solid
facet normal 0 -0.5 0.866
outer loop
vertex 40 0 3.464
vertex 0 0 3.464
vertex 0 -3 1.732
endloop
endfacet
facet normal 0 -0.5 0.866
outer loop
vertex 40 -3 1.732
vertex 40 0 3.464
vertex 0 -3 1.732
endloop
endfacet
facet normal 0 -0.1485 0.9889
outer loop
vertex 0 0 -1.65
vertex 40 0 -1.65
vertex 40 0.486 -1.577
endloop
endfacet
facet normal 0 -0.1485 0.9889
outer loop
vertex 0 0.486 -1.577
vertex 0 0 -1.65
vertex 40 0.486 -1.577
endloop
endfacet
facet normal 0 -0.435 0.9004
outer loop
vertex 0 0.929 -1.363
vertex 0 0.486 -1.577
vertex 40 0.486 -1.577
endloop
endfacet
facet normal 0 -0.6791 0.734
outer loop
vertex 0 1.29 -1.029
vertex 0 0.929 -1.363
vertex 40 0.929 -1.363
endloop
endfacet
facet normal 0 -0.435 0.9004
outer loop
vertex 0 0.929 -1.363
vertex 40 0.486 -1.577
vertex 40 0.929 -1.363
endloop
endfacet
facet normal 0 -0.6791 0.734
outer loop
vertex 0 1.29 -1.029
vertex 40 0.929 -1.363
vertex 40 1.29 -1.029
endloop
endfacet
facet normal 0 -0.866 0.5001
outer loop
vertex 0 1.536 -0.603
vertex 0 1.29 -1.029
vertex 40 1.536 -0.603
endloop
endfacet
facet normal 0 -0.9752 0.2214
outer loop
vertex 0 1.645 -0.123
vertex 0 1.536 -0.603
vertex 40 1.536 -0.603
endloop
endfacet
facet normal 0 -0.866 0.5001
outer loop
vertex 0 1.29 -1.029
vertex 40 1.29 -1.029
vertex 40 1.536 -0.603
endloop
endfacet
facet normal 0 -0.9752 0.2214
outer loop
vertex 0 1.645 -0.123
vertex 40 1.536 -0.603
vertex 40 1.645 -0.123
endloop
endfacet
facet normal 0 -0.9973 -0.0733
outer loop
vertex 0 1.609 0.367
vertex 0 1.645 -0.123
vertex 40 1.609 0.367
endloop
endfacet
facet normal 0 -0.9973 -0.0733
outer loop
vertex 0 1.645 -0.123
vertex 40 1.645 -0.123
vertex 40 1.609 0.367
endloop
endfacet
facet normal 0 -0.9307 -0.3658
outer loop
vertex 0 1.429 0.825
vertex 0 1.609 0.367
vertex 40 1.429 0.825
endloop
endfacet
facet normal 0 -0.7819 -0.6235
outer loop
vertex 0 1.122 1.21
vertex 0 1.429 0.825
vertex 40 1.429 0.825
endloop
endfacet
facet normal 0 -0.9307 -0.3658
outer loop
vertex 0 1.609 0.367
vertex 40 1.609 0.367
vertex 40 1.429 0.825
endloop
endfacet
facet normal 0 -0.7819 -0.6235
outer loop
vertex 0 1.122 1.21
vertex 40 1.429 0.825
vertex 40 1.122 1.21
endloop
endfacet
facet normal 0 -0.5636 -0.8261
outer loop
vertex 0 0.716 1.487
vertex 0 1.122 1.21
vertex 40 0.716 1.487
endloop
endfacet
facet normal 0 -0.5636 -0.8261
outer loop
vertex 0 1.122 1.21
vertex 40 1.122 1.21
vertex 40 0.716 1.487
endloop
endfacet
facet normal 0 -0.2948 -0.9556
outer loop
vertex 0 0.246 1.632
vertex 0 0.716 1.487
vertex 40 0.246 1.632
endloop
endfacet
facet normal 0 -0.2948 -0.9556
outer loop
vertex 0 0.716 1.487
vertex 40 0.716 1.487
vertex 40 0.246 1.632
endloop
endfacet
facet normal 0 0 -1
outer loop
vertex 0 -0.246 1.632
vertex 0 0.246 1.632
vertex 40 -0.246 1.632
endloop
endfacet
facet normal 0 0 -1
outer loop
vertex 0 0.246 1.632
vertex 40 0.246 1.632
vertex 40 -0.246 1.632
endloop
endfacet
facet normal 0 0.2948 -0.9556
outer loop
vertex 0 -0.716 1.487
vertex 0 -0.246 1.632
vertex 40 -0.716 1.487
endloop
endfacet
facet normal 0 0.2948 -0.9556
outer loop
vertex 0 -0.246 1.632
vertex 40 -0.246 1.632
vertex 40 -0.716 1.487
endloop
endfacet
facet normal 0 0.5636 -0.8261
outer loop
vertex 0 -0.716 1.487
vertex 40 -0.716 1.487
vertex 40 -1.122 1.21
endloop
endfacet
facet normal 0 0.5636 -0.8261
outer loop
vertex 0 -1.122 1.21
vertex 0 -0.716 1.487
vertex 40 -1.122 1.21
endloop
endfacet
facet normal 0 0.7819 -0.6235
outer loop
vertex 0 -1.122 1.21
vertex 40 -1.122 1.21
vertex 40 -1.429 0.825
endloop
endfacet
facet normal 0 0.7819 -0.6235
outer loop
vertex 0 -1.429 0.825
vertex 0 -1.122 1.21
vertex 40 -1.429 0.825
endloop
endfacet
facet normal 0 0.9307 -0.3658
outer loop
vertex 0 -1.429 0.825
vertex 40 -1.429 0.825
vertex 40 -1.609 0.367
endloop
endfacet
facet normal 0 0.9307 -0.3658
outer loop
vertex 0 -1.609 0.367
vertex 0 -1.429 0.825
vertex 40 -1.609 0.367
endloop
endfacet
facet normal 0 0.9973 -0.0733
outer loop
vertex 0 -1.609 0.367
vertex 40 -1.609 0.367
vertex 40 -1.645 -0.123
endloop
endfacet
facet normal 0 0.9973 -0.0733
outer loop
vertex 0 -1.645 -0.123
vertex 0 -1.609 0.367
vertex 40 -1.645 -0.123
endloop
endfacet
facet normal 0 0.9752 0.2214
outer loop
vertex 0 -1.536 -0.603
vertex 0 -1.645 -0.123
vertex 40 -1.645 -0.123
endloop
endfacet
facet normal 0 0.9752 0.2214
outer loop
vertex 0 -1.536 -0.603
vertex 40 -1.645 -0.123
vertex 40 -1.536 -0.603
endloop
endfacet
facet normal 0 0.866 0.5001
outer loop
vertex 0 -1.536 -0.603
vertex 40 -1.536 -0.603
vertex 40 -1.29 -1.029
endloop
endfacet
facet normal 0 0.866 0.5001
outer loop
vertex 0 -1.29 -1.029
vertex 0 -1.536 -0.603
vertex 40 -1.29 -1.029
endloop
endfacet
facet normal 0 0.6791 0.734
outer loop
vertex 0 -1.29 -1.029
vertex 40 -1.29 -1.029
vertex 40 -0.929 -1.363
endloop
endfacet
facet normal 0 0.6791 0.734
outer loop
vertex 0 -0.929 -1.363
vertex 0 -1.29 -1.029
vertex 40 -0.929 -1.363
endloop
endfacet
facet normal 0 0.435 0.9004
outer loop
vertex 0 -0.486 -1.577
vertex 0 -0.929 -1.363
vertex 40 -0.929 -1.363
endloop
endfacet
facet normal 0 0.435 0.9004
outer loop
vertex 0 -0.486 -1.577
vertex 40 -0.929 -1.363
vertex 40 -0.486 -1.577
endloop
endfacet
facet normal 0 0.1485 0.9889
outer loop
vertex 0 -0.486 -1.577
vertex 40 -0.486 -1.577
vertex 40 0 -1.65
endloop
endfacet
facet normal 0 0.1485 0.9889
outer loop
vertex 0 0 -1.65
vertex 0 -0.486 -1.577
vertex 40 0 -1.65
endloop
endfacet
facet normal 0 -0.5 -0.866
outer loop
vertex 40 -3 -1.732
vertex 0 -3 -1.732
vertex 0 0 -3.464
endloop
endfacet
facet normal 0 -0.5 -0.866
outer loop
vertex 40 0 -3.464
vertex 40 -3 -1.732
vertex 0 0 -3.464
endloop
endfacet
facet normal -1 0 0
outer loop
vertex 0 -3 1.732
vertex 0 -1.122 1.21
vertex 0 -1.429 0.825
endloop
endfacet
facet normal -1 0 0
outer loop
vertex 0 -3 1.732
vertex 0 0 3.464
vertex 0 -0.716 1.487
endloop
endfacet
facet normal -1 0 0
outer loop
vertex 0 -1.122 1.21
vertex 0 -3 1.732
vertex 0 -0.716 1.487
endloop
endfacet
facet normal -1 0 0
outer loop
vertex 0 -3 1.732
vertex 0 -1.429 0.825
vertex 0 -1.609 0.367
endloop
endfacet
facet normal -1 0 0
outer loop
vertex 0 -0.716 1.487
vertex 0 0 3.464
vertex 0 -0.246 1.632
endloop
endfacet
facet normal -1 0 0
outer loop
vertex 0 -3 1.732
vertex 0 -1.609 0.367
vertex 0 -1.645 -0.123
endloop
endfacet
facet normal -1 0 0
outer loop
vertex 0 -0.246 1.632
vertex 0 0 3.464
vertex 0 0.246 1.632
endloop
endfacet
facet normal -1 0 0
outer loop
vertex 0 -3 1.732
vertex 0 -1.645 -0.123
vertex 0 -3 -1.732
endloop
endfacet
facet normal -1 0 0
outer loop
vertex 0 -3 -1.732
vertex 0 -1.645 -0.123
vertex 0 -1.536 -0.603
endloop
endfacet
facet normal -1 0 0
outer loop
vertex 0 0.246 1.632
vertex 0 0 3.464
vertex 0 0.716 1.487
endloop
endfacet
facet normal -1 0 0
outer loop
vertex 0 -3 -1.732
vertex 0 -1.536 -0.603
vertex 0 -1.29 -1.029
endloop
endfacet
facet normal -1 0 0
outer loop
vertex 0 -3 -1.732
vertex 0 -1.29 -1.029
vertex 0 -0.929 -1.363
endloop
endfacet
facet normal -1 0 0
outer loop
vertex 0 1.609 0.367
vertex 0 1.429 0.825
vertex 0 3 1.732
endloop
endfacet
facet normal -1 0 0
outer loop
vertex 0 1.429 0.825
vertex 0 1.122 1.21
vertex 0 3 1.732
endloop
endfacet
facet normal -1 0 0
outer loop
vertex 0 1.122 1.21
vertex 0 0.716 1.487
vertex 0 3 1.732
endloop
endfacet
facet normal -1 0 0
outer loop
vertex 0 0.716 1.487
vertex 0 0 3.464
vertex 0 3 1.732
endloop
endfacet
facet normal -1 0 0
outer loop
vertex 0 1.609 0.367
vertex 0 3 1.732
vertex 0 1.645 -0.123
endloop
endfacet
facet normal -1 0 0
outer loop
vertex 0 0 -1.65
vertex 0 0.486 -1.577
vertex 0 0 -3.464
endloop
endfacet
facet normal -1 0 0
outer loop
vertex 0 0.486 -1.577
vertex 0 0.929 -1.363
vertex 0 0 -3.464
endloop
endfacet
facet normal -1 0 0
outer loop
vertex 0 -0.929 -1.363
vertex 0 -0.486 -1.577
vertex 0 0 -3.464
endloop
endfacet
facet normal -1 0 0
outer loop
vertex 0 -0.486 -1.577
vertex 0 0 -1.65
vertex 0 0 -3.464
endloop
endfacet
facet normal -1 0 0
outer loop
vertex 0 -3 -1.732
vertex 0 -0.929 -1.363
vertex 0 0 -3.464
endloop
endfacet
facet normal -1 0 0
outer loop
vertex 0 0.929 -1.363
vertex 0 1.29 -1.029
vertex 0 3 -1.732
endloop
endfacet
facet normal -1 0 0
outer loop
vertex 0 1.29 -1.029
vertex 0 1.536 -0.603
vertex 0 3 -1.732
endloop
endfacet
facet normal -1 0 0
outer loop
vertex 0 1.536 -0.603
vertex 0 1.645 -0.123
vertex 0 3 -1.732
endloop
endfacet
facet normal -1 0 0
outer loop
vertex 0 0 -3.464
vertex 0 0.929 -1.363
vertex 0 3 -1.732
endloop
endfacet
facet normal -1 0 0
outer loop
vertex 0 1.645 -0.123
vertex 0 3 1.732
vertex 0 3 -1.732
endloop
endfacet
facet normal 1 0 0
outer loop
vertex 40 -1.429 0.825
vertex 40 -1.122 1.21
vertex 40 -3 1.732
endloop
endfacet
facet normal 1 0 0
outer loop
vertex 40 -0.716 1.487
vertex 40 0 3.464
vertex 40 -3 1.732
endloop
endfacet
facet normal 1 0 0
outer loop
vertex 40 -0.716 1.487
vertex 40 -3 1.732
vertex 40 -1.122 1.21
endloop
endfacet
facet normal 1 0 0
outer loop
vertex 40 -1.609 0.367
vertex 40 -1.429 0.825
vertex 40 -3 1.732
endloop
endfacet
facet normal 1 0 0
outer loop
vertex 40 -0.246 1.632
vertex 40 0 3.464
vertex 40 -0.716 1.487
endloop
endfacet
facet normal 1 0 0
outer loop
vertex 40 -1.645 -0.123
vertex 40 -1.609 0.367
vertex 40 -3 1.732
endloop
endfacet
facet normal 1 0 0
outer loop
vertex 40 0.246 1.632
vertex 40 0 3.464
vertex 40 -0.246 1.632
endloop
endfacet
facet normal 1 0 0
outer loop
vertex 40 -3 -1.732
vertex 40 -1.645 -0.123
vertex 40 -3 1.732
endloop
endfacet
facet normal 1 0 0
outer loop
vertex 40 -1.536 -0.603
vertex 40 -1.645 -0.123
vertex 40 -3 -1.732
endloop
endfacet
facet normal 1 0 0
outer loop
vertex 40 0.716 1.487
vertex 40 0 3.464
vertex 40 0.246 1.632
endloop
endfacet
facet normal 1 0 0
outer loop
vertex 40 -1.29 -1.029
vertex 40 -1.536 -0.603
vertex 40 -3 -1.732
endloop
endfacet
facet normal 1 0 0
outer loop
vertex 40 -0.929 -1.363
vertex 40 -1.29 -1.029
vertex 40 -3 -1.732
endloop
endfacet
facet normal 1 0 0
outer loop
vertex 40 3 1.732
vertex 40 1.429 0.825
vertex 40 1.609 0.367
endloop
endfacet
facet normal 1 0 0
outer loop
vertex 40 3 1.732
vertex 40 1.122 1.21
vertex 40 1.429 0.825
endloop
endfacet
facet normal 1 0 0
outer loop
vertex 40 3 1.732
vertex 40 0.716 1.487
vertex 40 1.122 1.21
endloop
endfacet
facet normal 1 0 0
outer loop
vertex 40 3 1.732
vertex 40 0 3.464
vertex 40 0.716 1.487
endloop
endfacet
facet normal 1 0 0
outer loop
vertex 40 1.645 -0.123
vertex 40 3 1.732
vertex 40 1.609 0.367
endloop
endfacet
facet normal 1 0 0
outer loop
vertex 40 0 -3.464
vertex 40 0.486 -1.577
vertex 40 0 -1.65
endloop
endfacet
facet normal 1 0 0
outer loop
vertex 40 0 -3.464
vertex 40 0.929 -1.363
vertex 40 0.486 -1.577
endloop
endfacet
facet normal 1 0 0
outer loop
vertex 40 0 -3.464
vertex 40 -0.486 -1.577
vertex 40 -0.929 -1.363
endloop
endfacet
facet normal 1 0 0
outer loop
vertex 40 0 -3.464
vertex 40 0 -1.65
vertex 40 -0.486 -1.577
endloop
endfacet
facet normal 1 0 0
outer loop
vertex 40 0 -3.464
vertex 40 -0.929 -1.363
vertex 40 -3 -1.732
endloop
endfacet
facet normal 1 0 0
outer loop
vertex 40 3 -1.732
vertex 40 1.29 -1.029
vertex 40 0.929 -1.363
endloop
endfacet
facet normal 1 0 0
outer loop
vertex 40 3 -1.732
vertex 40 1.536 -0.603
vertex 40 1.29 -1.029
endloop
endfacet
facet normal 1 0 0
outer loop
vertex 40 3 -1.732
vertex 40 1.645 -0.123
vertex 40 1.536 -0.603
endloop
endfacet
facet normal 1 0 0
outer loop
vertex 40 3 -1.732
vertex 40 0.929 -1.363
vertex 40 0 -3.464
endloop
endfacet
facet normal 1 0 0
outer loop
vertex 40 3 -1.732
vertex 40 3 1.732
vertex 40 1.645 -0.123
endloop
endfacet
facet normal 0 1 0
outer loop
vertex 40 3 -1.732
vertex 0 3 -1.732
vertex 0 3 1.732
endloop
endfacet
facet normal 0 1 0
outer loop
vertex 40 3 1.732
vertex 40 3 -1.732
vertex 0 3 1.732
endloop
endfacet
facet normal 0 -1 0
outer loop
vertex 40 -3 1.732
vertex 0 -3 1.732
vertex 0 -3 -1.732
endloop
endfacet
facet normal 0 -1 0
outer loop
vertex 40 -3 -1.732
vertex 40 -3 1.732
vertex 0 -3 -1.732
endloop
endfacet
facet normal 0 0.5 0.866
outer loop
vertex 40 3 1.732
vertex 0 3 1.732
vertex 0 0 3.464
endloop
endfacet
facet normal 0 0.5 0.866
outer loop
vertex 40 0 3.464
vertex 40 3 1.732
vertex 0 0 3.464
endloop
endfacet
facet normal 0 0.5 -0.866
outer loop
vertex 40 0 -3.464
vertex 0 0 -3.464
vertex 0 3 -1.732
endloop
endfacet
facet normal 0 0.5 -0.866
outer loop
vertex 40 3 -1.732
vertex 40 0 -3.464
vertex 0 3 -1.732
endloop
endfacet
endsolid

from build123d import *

# Parameters (mm, degrees)
EXTRUDE_1_DEPTH    = 40
HOLE_WIZARD_M4_1_D = 3.3


with BuildPart() as part:
    # 草图1 → 凸台-拉伸1 (new body)
    with BuildSketch(Plane(origin=(0, 0, 0), x_dir=(0, 0, -1), z_dir=(1, 0, 0))):
        Polygon((3.464101615, 0), (1.732050808, 3), (-1.732050808, 3), (-3.464101615, 0), (-1.732050808, -3), (1.732050808, -3), align=None)
    extrude(amount=EXTRUDE_1_DEPTH)

    # M4 螺纹孔1 (through all)
    with Locations(Plane.ZY):
        with Locations((0, 0)):
            Hole(HOLE_WIZARD_M4_1_D / 2)


solid = part.part
